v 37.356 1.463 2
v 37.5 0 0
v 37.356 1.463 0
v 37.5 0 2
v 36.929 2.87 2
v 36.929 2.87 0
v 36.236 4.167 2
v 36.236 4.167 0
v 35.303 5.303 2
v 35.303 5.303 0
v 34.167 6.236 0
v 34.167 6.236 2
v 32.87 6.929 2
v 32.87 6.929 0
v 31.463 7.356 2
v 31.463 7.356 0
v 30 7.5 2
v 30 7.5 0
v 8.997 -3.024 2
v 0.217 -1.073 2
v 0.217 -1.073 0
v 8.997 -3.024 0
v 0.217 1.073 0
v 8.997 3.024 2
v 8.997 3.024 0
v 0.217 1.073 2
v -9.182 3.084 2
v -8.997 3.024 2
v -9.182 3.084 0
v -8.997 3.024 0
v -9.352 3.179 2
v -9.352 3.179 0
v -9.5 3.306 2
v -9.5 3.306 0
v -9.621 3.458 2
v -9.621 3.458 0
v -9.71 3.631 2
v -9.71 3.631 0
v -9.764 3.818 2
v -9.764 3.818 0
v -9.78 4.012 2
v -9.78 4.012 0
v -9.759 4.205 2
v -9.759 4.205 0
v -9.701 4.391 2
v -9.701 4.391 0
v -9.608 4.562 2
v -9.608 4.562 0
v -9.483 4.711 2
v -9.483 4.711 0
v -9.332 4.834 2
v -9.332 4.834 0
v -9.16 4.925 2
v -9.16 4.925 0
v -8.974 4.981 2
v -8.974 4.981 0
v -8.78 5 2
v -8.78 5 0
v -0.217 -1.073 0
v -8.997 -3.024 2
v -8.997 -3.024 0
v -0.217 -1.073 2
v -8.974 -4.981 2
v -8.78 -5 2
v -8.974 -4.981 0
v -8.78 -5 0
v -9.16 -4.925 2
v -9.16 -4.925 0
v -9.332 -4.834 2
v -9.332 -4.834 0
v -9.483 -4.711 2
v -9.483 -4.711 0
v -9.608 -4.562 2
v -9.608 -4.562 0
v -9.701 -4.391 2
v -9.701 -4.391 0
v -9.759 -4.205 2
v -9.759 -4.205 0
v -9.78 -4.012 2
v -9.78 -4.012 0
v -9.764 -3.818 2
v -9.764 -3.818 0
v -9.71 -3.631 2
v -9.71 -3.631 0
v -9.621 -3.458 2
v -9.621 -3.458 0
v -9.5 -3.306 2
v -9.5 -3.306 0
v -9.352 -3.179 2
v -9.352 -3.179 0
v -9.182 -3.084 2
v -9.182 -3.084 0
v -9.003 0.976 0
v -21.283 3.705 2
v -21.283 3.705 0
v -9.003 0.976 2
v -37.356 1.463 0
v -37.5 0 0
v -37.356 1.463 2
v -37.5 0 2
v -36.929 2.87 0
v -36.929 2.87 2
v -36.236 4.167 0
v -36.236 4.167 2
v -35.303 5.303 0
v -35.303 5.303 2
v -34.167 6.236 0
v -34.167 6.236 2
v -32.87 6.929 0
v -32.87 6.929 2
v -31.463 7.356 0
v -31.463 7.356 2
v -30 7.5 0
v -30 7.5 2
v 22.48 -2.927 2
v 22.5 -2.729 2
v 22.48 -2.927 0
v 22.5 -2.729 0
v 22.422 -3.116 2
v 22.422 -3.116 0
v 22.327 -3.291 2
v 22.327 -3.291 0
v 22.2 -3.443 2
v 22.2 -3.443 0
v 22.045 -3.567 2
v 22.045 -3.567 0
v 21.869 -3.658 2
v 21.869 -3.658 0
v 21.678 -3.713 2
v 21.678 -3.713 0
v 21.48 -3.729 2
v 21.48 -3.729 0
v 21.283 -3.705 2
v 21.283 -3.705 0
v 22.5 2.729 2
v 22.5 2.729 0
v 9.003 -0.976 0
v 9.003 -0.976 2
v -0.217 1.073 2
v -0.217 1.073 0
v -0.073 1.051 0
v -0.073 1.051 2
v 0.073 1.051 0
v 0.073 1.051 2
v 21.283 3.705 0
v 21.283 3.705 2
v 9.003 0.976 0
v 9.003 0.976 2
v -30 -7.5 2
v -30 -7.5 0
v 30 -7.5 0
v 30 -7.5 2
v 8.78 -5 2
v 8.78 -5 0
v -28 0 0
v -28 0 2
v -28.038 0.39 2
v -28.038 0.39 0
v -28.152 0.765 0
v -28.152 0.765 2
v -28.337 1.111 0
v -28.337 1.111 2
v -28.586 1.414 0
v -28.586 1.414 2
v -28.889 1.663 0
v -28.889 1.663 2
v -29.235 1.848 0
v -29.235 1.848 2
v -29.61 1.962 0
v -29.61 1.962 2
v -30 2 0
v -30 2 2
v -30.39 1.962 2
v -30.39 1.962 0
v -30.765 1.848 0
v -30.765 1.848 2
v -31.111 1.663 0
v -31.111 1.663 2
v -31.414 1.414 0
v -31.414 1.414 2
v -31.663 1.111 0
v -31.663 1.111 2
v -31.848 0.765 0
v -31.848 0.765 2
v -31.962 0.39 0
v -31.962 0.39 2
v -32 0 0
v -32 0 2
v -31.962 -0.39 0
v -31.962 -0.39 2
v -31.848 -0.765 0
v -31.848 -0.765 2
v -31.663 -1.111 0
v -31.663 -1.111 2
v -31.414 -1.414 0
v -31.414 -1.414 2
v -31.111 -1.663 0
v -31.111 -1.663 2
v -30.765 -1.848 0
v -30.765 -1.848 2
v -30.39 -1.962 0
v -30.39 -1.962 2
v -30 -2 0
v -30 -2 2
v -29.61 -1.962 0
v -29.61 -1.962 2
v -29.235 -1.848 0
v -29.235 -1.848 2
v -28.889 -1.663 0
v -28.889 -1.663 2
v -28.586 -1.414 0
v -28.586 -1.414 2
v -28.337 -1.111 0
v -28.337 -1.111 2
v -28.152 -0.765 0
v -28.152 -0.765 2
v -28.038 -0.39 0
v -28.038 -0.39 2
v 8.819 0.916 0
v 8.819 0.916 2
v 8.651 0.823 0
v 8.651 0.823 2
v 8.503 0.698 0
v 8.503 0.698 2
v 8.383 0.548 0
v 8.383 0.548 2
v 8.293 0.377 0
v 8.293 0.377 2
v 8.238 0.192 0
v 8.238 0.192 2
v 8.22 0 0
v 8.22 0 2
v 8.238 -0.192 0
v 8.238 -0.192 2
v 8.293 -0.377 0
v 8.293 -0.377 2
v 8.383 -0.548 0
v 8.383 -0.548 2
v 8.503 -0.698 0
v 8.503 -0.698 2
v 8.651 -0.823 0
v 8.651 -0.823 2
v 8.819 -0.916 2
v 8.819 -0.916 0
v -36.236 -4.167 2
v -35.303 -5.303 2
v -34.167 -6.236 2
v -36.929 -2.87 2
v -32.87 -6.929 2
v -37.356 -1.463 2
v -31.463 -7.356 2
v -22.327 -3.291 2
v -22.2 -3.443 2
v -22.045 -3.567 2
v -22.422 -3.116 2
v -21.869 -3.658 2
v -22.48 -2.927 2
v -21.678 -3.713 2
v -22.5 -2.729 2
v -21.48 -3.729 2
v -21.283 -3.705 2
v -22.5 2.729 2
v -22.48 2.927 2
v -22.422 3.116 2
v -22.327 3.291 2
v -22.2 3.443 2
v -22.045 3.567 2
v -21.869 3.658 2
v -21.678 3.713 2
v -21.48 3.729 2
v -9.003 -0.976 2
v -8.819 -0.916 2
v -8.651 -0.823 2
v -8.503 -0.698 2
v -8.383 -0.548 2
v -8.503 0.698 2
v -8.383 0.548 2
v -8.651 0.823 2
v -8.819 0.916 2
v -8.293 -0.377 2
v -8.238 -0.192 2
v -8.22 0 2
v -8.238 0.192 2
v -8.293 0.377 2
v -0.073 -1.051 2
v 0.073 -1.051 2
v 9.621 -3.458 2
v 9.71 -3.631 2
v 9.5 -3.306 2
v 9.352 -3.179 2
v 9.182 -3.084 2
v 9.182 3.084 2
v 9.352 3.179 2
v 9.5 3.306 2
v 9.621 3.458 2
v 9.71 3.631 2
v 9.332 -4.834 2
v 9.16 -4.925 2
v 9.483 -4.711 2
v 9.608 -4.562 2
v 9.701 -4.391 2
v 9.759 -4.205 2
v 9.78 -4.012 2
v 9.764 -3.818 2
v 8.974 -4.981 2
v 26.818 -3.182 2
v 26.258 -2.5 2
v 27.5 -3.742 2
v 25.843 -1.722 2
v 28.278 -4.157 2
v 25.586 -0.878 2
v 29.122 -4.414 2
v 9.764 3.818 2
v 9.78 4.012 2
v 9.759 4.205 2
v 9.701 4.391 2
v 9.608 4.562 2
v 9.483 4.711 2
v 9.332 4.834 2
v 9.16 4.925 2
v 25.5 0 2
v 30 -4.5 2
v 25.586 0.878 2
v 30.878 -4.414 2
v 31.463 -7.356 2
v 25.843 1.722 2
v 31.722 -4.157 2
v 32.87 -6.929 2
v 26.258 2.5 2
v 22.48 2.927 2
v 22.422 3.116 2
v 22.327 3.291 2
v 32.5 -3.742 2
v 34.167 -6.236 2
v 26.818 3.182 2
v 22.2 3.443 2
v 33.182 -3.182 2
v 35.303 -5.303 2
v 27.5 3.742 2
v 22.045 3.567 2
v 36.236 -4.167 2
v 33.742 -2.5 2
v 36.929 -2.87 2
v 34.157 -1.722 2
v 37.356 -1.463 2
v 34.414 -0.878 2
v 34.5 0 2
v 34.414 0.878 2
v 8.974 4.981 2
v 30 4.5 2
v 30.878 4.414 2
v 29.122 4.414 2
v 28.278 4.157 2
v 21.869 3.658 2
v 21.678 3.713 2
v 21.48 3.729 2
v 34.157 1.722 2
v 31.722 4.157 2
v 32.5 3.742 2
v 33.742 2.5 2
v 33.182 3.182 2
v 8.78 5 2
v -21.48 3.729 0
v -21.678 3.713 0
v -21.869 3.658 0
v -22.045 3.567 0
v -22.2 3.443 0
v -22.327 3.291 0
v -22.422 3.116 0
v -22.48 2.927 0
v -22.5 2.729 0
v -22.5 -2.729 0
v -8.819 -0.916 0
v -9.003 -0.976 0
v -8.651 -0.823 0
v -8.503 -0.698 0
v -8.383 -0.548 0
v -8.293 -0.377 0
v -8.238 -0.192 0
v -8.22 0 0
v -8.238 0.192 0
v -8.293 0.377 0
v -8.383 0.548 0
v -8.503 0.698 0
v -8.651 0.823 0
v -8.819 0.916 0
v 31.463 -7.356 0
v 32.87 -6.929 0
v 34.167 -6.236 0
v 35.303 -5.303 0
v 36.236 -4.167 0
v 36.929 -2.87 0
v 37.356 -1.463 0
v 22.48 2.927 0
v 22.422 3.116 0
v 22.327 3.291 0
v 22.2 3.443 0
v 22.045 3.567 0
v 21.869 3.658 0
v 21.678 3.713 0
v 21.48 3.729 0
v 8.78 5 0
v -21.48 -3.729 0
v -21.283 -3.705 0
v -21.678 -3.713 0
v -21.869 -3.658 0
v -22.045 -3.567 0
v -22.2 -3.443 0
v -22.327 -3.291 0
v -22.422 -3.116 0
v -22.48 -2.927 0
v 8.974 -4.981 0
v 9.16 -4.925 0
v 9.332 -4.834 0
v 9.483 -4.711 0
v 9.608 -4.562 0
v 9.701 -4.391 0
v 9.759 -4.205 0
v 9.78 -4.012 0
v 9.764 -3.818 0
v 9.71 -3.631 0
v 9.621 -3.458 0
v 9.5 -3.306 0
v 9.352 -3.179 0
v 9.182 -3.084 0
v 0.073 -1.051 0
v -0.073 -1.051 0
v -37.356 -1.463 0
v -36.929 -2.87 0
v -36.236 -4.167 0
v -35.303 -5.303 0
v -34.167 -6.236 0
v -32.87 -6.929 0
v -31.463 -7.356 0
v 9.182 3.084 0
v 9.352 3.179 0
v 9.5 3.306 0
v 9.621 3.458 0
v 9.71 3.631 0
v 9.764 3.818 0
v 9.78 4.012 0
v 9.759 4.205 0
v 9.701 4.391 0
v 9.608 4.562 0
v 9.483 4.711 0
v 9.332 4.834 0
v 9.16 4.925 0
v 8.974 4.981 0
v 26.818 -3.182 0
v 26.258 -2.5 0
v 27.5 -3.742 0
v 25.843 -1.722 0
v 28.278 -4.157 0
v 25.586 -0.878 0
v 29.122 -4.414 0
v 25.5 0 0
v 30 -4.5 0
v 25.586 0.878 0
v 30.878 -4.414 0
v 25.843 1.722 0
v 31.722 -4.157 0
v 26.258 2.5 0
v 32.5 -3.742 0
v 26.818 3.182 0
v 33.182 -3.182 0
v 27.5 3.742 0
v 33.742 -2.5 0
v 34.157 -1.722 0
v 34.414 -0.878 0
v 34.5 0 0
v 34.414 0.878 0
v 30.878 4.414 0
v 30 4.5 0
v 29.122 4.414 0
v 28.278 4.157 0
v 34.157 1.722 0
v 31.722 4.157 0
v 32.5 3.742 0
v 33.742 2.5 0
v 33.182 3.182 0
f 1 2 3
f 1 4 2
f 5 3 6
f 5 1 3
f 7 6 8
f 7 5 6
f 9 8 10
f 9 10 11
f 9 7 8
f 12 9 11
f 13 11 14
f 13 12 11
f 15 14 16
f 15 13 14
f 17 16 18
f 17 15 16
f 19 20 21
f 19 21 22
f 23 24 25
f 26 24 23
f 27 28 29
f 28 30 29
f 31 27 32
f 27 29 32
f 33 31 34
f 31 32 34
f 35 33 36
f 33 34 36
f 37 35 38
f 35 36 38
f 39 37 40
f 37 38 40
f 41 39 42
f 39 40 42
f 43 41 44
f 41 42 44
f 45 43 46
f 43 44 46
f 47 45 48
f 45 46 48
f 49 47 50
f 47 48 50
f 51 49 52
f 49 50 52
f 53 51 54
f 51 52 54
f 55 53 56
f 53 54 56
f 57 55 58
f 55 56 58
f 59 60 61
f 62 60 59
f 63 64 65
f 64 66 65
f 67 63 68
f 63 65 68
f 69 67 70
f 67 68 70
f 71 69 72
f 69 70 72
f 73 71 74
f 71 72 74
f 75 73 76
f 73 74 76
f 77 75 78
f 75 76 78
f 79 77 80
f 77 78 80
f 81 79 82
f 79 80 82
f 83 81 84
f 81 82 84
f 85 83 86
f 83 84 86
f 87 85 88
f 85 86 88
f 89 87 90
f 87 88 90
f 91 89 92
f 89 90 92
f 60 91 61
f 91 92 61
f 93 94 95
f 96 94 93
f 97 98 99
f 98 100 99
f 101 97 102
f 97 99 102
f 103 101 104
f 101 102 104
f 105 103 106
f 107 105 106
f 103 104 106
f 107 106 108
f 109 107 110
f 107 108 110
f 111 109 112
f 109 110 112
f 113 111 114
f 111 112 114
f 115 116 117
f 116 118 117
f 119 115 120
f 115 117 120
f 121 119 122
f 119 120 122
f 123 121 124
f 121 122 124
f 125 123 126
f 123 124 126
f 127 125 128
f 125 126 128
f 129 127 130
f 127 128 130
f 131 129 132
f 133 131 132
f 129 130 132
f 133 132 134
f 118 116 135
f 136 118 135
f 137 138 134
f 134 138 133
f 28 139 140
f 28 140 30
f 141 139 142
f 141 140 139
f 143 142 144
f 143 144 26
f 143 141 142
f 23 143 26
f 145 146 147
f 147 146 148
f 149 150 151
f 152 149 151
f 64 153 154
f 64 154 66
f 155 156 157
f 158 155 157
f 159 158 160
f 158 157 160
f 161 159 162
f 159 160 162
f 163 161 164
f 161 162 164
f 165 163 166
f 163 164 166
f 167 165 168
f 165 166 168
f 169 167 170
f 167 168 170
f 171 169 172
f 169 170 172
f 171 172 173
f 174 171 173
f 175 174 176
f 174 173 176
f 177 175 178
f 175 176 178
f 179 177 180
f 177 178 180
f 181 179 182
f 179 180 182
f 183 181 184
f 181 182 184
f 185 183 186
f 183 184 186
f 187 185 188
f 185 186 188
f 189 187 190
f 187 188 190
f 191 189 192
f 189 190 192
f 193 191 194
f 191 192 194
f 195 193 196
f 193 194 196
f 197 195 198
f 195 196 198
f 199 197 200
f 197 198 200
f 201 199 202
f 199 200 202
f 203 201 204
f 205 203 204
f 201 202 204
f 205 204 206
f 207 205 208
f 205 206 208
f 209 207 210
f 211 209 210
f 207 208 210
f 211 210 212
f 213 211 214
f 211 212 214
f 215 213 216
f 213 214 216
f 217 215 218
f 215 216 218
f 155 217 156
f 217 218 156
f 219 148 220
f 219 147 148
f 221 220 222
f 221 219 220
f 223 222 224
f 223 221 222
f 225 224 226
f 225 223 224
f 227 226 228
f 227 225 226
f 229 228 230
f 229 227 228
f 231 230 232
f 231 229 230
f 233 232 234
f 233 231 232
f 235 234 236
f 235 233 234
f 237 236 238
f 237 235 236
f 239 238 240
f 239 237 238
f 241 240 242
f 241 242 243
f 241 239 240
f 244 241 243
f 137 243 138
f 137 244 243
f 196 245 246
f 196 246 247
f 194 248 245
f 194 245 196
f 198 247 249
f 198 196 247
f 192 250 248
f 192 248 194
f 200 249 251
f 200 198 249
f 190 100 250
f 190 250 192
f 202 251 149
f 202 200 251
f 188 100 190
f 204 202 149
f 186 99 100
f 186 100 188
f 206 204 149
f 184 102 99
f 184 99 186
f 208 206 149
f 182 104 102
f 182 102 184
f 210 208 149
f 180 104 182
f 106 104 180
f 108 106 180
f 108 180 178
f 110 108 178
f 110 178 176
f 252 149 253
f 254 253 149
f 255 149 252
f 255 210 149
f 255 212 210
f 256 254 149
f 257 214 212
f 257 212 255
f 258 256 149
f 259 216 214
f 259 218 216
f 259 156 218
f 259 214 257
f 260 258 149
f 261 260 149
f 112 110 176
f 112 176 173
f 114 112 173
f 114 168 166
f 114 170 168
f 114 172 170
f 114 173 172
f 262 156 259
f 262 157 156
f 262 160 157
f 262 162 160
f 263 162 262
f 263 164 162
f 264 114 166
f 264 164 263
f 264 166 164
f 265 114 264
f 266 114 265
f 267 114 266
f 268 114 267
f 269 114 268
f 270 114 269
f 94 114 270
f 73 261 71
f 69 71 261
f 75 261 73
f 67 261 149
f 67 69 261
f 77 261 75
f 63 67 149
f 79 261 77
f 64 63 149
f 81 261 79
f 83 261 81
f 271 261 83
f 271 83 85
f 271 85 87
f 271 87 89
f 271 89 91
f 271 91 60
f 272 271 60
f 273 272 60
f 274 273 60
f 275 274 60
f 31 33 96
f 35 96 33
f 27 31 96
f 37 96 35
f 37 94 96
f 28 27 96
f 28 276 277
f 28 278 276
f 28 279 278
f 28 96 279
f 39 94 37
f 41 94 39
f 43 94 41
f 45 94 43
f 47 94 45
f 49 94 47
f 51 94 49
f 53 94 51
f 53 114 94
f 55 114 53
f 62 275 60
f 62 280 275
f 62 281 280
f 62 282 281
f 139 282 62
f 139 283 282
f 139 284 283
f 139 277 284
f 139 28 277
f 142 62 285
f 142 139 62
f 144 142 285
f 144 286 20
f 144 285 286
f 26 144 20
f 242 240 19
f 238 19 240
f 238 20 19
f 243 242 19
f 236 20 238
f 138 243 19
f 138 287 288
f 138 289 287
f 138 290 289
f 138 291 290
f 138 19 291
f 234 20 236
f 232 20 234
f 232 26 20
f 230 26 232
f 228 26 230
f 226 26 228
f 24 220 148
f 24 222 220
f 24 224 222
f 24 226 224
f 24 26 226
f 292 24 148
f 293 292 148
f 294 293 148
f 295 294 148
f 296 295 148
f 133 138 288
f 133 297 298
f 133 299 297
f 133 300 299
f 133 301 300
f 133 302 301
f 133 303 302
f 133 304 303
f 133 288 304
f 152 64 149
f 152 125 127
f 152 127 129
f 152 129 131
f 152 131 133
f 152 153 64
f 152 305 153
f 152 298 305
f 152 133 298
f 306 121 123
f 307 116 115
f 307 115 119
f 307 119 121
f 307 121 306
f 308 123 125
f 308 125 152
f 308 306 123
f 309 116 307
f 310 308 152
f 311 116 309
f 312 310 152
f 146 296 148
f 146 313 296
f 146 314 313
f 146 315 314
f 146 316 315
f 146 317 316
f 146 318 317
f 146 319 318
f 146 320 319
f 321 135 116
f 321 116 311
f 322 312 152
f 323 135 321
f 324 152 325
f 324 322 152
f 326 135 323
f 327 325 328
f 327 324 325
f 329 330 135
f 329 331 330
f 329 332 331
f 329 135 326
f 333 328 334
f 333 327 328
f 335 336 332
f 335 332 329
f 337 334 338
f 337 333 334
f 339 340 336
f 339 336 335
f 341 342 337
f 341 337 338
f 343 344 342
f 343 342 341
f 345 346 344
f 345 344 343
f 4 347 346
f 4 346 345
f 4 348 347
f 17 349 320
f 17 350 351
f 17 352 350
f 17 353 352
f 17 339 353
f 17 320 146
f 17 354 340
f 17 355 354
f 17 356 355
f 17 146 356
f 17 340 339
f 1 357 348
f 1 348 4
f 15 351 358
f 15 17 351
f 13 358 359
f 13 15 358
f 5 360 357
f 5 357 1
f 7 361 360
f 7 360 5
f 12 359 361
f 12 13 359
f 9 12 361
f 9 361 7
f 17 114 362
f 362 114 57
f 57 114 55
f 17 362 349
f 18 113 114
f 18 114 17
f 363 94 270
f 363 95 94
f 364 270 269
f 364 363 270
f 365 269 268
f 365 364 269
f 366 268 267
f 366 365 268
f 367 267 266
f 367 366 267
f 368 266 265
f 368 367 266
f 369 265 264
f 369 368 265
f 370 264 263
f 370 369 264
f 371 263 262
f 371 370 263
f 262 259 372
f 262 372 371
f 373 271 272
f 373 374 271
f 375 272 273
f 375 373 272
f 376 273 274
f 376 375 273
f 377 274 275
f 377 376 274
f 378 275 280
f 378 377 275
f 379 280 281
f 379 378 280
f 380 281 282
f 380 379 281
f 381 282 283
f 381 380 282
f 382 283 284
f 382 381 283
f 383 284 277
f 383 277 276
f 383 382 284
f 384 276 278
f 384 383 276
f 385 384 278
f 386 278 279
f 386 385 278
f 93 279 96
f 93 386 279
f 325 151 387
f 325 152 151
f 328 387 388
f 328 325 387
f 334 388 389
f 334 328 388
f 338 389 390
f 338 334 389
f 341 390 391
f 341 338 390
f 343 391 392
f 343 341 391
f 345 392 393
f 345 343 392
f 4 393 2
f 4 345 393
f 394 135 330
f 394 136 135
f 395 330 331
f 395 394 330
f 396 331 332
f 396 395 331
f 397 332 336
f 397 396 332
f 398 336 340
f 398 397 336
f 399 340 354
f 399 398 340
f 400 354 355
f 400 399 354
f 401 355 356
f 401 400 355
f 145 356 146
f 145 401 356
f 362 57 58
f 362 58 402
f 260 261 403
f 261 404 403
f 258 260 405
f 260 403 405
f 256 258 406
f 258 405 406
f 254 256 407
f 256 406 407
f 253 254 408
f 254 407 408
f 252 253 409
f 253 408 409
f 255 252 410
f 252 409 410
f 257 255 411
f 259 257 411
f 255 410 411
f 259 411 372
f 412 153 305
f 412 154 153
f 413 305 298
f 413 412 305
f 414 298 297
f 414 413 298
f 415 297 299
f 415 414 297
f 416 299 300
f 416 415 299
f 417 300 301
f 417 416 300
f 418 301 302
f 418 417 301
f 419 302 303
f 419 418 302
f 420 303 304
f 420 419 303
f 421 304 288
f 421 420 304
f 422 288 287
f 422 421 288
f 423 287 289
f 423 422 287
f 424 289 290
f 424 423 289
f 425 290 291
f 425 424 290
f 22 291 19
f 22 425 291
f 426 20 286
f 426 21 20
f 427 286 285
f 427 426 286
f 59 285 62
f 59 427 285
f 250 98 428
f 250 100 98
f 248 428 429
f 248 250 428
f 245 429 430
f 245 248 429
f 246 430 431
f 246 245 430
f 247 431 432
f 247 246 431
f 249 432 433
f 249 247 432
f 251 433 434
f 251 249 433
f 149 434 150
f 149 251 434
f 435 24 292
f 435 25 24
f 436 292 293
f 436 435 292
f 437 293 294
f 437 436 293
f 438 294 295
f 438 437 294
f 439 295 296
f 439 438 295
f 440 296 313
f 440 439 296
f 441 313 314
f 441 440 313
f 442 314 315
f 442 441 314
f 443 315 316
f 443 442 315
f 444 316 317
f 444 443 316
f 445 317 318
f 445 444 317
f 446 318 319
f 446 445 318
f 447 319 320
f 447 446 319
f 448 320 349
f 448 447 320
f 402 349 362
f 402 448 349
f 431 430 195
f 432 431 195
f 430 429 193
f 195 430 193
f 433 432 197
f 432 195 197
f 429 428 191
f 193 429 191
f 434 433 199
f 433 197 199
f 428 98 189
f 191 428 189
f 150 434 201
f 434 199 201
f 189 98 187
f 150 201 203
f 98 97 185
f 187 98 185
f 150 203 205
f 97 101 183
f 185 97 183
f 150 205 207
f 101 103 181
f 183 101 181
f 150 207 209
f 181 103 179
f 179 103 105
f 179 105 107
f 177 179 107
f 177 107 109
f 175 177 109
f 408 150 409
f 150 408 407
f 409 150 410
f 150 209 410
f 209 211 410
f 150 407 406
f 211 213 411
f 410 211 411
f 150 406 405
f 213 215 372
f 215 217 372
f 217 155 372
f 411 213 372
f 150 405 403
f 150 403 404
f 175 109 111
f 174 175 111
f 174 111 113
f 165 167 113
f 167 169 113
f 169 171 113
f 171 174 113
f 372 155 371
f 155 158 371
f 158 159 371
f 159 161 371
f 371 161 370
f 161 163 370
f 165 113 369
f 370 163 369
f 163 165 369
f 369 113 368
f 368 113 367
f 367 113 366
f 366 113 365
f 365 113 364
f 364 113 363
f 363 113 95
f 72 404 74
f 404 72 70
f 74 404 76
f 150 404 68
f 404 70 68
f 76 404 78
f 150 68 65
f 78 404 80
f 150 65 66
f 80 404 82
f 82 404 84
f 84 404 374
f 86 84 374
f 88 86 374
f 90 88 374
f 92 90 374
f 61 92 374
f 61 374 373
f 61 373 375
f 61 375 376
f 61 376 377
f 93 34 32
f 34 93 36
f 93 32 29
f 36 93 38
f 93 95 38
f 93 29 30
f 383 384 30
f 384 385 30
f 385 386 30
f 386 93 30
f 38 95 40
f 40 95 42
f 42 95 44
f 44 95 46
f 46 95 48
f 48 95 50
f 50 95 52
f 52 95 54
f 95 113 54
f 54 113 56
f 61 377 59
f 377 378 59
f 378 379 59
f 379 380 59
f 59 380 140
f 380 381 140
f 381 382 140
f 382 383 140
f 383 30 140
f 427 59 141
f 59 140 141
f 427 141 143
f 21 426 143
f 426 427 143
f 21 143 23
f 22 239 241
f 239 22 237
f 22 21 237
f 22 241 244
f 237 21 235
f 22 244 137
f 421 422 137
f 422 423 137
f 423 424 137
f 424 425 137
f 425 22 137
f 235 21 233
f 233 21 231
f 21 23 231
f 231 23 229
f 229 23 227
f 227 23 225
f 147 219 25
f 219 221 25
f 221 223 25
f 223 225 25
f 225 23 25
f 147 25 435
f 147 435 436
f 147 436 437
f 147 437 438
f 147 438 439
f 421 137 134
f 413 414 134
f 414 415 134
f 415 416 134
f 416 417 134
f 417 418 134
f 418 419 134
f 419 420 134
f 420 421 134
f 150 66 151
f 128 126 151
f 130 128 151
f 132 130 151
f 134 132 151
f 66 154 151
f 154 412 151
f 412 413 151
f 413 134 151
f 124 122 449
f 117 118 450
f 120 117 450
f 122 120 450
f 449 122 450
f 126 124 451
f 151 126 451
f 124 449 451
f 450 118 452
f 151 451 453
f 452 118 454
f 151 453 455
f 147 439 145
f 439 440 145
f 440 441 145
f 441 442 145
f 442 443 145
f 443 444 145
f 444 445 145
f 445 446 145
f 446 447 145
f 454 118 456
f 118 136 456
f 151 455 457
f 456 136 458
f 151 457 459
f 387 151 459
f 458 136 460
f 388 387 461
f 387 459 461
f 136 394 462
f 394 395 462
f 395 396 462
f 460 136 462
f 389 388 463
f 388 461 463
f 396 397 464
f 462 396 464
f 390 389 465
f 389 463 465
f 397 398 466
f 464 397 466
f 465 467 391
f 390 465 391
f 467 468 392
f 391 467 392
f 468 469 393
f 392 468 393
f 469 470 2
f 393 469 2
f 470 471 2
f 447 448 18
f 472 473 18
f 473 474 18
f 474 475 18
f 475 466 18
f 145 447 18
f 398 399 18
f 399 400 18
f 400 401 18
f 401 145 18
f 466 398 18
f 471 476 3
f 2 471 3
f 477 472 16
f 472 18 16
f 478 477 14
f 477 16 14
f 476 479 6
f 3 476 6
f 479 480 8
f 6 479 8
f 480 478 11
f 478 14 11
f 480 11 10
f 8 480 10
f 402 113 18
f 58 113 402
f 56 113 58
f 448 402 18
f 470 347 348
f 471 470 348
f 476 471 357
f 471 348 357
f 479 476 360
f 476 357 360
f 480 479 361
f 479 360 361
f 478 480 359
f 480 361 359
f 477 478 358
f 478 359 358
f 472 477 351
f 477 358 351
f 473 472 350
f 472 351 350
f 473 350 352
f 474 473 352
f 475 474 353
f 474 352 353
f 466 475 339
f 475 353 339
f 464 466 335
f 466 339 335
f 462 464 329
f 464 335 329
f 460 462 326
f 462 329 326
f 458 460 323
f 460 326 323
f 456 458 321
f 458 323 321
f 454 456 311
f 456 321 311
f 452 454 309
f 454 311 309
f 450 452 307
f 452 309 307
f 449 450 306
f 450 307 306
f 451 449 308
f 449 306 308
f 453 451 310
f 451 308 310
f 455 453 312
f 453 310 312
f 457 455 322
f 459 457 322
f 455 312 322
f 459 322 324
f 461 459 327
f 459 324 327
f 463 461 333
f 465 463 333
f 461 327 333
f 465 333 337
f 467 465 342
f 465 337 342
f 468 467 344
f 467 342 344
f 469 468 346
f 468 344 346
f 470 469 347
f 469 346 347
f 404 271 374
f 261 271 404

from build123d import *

# Parameters (mm, degrees)
SKETCH_1_W          = 75
SKETCH_1_H          = 15
EXTRUDE_1_DEPTH     = 2
FILLET_1_R          = 7.5
SKETCH_2_R          = 4.5
SKETCH_2_R_2        = 2
CUT_EXTRUDE_1_DEPTH = 2
CUT_EXTRUDE_3_DEPTH = 10
FILLET_5_R          = 1


with BuildPart() as part:
    # 草图1 → 凸台-拉伸1 (new body)
    with BuildSketch(Plane.XY):
        Rectangle(SKETCH_1_W, SKETCH_1_H)
    extrude(amount=EXTRUDE_1_DEPTH)

    # 圆角1
    fillet_1_edges = [part.edges().sort_by_distance(p)[0] for p in [
        (37.5, -7.5, 1),
        (-37.5, -7.5, 1),
        (-37.5, 7.5, 1),
        (37.5, 7.5, 1),
    ]]
    fillet(fillet_1_edges, radius=FILLET_1_R - 0.0001)  # a hair under: the kernel refuses the full size

    # 草图2 → 切除-拉伸1 (cut)
    with BuildSketch(Plane.XY.offset(2)):
        with Locations((30, 0)):
            Circle(SKETCH_2_R)
        with Locations((-30, 0)):
            Circle(SKETCH_2_R_2)
    extrude(amount=-CUT_EXTRUDE_1_DEPTH, mode=Mode.SUBTRACT)

    # 草图3 → 切除-拉伸3 (cut)
    with BuildSketch(Plane.XY.offset(2)):
        Polygon((-17.890227771, -5), (0, -1.024393829), (17.890227771, -5), align=None)
        Polygon((-22.5, -3.975606171), (-22.5, 3.975606171), (-4.609772229, 0), align=None)
        Polygon((-17.890227771, 5), (17.890227771, 5), (0, 1.024393829), align=None)
        Polygon((22.5, -3.975606171), (22.5, 3.975606171), (4.609772229, 0), align=None)
    extrude(amount=-CUT_EXTRUDE_3_DEPTH, mode=Mode.SUBTRACT)

    # 圆角5
    fillet_5_edges = [part.edges().sort_by_distance(p)[0] for p in [
        (0, 1.024393829, 1),
        (-17.890227771, 5, 1),
        (17.890227771, 5, 1),
        (4.609772229, 0, 1),
        (22.5, 3.975606171, 1),
        (22.5, -3.975606171, 1),
        (0, -1.024393829, 1),
        (17.890227771, -5, 1),
        (-17.890227771, -5, 1),
        (-22.5, 3.975606171, 1),
        (-4.609772229, 0, 1),
        (-22.5, -3.975606171, 1),
    ]]
    fillet(fillet_5_edges, radius=FILLET_5_R)


solid = part.part
